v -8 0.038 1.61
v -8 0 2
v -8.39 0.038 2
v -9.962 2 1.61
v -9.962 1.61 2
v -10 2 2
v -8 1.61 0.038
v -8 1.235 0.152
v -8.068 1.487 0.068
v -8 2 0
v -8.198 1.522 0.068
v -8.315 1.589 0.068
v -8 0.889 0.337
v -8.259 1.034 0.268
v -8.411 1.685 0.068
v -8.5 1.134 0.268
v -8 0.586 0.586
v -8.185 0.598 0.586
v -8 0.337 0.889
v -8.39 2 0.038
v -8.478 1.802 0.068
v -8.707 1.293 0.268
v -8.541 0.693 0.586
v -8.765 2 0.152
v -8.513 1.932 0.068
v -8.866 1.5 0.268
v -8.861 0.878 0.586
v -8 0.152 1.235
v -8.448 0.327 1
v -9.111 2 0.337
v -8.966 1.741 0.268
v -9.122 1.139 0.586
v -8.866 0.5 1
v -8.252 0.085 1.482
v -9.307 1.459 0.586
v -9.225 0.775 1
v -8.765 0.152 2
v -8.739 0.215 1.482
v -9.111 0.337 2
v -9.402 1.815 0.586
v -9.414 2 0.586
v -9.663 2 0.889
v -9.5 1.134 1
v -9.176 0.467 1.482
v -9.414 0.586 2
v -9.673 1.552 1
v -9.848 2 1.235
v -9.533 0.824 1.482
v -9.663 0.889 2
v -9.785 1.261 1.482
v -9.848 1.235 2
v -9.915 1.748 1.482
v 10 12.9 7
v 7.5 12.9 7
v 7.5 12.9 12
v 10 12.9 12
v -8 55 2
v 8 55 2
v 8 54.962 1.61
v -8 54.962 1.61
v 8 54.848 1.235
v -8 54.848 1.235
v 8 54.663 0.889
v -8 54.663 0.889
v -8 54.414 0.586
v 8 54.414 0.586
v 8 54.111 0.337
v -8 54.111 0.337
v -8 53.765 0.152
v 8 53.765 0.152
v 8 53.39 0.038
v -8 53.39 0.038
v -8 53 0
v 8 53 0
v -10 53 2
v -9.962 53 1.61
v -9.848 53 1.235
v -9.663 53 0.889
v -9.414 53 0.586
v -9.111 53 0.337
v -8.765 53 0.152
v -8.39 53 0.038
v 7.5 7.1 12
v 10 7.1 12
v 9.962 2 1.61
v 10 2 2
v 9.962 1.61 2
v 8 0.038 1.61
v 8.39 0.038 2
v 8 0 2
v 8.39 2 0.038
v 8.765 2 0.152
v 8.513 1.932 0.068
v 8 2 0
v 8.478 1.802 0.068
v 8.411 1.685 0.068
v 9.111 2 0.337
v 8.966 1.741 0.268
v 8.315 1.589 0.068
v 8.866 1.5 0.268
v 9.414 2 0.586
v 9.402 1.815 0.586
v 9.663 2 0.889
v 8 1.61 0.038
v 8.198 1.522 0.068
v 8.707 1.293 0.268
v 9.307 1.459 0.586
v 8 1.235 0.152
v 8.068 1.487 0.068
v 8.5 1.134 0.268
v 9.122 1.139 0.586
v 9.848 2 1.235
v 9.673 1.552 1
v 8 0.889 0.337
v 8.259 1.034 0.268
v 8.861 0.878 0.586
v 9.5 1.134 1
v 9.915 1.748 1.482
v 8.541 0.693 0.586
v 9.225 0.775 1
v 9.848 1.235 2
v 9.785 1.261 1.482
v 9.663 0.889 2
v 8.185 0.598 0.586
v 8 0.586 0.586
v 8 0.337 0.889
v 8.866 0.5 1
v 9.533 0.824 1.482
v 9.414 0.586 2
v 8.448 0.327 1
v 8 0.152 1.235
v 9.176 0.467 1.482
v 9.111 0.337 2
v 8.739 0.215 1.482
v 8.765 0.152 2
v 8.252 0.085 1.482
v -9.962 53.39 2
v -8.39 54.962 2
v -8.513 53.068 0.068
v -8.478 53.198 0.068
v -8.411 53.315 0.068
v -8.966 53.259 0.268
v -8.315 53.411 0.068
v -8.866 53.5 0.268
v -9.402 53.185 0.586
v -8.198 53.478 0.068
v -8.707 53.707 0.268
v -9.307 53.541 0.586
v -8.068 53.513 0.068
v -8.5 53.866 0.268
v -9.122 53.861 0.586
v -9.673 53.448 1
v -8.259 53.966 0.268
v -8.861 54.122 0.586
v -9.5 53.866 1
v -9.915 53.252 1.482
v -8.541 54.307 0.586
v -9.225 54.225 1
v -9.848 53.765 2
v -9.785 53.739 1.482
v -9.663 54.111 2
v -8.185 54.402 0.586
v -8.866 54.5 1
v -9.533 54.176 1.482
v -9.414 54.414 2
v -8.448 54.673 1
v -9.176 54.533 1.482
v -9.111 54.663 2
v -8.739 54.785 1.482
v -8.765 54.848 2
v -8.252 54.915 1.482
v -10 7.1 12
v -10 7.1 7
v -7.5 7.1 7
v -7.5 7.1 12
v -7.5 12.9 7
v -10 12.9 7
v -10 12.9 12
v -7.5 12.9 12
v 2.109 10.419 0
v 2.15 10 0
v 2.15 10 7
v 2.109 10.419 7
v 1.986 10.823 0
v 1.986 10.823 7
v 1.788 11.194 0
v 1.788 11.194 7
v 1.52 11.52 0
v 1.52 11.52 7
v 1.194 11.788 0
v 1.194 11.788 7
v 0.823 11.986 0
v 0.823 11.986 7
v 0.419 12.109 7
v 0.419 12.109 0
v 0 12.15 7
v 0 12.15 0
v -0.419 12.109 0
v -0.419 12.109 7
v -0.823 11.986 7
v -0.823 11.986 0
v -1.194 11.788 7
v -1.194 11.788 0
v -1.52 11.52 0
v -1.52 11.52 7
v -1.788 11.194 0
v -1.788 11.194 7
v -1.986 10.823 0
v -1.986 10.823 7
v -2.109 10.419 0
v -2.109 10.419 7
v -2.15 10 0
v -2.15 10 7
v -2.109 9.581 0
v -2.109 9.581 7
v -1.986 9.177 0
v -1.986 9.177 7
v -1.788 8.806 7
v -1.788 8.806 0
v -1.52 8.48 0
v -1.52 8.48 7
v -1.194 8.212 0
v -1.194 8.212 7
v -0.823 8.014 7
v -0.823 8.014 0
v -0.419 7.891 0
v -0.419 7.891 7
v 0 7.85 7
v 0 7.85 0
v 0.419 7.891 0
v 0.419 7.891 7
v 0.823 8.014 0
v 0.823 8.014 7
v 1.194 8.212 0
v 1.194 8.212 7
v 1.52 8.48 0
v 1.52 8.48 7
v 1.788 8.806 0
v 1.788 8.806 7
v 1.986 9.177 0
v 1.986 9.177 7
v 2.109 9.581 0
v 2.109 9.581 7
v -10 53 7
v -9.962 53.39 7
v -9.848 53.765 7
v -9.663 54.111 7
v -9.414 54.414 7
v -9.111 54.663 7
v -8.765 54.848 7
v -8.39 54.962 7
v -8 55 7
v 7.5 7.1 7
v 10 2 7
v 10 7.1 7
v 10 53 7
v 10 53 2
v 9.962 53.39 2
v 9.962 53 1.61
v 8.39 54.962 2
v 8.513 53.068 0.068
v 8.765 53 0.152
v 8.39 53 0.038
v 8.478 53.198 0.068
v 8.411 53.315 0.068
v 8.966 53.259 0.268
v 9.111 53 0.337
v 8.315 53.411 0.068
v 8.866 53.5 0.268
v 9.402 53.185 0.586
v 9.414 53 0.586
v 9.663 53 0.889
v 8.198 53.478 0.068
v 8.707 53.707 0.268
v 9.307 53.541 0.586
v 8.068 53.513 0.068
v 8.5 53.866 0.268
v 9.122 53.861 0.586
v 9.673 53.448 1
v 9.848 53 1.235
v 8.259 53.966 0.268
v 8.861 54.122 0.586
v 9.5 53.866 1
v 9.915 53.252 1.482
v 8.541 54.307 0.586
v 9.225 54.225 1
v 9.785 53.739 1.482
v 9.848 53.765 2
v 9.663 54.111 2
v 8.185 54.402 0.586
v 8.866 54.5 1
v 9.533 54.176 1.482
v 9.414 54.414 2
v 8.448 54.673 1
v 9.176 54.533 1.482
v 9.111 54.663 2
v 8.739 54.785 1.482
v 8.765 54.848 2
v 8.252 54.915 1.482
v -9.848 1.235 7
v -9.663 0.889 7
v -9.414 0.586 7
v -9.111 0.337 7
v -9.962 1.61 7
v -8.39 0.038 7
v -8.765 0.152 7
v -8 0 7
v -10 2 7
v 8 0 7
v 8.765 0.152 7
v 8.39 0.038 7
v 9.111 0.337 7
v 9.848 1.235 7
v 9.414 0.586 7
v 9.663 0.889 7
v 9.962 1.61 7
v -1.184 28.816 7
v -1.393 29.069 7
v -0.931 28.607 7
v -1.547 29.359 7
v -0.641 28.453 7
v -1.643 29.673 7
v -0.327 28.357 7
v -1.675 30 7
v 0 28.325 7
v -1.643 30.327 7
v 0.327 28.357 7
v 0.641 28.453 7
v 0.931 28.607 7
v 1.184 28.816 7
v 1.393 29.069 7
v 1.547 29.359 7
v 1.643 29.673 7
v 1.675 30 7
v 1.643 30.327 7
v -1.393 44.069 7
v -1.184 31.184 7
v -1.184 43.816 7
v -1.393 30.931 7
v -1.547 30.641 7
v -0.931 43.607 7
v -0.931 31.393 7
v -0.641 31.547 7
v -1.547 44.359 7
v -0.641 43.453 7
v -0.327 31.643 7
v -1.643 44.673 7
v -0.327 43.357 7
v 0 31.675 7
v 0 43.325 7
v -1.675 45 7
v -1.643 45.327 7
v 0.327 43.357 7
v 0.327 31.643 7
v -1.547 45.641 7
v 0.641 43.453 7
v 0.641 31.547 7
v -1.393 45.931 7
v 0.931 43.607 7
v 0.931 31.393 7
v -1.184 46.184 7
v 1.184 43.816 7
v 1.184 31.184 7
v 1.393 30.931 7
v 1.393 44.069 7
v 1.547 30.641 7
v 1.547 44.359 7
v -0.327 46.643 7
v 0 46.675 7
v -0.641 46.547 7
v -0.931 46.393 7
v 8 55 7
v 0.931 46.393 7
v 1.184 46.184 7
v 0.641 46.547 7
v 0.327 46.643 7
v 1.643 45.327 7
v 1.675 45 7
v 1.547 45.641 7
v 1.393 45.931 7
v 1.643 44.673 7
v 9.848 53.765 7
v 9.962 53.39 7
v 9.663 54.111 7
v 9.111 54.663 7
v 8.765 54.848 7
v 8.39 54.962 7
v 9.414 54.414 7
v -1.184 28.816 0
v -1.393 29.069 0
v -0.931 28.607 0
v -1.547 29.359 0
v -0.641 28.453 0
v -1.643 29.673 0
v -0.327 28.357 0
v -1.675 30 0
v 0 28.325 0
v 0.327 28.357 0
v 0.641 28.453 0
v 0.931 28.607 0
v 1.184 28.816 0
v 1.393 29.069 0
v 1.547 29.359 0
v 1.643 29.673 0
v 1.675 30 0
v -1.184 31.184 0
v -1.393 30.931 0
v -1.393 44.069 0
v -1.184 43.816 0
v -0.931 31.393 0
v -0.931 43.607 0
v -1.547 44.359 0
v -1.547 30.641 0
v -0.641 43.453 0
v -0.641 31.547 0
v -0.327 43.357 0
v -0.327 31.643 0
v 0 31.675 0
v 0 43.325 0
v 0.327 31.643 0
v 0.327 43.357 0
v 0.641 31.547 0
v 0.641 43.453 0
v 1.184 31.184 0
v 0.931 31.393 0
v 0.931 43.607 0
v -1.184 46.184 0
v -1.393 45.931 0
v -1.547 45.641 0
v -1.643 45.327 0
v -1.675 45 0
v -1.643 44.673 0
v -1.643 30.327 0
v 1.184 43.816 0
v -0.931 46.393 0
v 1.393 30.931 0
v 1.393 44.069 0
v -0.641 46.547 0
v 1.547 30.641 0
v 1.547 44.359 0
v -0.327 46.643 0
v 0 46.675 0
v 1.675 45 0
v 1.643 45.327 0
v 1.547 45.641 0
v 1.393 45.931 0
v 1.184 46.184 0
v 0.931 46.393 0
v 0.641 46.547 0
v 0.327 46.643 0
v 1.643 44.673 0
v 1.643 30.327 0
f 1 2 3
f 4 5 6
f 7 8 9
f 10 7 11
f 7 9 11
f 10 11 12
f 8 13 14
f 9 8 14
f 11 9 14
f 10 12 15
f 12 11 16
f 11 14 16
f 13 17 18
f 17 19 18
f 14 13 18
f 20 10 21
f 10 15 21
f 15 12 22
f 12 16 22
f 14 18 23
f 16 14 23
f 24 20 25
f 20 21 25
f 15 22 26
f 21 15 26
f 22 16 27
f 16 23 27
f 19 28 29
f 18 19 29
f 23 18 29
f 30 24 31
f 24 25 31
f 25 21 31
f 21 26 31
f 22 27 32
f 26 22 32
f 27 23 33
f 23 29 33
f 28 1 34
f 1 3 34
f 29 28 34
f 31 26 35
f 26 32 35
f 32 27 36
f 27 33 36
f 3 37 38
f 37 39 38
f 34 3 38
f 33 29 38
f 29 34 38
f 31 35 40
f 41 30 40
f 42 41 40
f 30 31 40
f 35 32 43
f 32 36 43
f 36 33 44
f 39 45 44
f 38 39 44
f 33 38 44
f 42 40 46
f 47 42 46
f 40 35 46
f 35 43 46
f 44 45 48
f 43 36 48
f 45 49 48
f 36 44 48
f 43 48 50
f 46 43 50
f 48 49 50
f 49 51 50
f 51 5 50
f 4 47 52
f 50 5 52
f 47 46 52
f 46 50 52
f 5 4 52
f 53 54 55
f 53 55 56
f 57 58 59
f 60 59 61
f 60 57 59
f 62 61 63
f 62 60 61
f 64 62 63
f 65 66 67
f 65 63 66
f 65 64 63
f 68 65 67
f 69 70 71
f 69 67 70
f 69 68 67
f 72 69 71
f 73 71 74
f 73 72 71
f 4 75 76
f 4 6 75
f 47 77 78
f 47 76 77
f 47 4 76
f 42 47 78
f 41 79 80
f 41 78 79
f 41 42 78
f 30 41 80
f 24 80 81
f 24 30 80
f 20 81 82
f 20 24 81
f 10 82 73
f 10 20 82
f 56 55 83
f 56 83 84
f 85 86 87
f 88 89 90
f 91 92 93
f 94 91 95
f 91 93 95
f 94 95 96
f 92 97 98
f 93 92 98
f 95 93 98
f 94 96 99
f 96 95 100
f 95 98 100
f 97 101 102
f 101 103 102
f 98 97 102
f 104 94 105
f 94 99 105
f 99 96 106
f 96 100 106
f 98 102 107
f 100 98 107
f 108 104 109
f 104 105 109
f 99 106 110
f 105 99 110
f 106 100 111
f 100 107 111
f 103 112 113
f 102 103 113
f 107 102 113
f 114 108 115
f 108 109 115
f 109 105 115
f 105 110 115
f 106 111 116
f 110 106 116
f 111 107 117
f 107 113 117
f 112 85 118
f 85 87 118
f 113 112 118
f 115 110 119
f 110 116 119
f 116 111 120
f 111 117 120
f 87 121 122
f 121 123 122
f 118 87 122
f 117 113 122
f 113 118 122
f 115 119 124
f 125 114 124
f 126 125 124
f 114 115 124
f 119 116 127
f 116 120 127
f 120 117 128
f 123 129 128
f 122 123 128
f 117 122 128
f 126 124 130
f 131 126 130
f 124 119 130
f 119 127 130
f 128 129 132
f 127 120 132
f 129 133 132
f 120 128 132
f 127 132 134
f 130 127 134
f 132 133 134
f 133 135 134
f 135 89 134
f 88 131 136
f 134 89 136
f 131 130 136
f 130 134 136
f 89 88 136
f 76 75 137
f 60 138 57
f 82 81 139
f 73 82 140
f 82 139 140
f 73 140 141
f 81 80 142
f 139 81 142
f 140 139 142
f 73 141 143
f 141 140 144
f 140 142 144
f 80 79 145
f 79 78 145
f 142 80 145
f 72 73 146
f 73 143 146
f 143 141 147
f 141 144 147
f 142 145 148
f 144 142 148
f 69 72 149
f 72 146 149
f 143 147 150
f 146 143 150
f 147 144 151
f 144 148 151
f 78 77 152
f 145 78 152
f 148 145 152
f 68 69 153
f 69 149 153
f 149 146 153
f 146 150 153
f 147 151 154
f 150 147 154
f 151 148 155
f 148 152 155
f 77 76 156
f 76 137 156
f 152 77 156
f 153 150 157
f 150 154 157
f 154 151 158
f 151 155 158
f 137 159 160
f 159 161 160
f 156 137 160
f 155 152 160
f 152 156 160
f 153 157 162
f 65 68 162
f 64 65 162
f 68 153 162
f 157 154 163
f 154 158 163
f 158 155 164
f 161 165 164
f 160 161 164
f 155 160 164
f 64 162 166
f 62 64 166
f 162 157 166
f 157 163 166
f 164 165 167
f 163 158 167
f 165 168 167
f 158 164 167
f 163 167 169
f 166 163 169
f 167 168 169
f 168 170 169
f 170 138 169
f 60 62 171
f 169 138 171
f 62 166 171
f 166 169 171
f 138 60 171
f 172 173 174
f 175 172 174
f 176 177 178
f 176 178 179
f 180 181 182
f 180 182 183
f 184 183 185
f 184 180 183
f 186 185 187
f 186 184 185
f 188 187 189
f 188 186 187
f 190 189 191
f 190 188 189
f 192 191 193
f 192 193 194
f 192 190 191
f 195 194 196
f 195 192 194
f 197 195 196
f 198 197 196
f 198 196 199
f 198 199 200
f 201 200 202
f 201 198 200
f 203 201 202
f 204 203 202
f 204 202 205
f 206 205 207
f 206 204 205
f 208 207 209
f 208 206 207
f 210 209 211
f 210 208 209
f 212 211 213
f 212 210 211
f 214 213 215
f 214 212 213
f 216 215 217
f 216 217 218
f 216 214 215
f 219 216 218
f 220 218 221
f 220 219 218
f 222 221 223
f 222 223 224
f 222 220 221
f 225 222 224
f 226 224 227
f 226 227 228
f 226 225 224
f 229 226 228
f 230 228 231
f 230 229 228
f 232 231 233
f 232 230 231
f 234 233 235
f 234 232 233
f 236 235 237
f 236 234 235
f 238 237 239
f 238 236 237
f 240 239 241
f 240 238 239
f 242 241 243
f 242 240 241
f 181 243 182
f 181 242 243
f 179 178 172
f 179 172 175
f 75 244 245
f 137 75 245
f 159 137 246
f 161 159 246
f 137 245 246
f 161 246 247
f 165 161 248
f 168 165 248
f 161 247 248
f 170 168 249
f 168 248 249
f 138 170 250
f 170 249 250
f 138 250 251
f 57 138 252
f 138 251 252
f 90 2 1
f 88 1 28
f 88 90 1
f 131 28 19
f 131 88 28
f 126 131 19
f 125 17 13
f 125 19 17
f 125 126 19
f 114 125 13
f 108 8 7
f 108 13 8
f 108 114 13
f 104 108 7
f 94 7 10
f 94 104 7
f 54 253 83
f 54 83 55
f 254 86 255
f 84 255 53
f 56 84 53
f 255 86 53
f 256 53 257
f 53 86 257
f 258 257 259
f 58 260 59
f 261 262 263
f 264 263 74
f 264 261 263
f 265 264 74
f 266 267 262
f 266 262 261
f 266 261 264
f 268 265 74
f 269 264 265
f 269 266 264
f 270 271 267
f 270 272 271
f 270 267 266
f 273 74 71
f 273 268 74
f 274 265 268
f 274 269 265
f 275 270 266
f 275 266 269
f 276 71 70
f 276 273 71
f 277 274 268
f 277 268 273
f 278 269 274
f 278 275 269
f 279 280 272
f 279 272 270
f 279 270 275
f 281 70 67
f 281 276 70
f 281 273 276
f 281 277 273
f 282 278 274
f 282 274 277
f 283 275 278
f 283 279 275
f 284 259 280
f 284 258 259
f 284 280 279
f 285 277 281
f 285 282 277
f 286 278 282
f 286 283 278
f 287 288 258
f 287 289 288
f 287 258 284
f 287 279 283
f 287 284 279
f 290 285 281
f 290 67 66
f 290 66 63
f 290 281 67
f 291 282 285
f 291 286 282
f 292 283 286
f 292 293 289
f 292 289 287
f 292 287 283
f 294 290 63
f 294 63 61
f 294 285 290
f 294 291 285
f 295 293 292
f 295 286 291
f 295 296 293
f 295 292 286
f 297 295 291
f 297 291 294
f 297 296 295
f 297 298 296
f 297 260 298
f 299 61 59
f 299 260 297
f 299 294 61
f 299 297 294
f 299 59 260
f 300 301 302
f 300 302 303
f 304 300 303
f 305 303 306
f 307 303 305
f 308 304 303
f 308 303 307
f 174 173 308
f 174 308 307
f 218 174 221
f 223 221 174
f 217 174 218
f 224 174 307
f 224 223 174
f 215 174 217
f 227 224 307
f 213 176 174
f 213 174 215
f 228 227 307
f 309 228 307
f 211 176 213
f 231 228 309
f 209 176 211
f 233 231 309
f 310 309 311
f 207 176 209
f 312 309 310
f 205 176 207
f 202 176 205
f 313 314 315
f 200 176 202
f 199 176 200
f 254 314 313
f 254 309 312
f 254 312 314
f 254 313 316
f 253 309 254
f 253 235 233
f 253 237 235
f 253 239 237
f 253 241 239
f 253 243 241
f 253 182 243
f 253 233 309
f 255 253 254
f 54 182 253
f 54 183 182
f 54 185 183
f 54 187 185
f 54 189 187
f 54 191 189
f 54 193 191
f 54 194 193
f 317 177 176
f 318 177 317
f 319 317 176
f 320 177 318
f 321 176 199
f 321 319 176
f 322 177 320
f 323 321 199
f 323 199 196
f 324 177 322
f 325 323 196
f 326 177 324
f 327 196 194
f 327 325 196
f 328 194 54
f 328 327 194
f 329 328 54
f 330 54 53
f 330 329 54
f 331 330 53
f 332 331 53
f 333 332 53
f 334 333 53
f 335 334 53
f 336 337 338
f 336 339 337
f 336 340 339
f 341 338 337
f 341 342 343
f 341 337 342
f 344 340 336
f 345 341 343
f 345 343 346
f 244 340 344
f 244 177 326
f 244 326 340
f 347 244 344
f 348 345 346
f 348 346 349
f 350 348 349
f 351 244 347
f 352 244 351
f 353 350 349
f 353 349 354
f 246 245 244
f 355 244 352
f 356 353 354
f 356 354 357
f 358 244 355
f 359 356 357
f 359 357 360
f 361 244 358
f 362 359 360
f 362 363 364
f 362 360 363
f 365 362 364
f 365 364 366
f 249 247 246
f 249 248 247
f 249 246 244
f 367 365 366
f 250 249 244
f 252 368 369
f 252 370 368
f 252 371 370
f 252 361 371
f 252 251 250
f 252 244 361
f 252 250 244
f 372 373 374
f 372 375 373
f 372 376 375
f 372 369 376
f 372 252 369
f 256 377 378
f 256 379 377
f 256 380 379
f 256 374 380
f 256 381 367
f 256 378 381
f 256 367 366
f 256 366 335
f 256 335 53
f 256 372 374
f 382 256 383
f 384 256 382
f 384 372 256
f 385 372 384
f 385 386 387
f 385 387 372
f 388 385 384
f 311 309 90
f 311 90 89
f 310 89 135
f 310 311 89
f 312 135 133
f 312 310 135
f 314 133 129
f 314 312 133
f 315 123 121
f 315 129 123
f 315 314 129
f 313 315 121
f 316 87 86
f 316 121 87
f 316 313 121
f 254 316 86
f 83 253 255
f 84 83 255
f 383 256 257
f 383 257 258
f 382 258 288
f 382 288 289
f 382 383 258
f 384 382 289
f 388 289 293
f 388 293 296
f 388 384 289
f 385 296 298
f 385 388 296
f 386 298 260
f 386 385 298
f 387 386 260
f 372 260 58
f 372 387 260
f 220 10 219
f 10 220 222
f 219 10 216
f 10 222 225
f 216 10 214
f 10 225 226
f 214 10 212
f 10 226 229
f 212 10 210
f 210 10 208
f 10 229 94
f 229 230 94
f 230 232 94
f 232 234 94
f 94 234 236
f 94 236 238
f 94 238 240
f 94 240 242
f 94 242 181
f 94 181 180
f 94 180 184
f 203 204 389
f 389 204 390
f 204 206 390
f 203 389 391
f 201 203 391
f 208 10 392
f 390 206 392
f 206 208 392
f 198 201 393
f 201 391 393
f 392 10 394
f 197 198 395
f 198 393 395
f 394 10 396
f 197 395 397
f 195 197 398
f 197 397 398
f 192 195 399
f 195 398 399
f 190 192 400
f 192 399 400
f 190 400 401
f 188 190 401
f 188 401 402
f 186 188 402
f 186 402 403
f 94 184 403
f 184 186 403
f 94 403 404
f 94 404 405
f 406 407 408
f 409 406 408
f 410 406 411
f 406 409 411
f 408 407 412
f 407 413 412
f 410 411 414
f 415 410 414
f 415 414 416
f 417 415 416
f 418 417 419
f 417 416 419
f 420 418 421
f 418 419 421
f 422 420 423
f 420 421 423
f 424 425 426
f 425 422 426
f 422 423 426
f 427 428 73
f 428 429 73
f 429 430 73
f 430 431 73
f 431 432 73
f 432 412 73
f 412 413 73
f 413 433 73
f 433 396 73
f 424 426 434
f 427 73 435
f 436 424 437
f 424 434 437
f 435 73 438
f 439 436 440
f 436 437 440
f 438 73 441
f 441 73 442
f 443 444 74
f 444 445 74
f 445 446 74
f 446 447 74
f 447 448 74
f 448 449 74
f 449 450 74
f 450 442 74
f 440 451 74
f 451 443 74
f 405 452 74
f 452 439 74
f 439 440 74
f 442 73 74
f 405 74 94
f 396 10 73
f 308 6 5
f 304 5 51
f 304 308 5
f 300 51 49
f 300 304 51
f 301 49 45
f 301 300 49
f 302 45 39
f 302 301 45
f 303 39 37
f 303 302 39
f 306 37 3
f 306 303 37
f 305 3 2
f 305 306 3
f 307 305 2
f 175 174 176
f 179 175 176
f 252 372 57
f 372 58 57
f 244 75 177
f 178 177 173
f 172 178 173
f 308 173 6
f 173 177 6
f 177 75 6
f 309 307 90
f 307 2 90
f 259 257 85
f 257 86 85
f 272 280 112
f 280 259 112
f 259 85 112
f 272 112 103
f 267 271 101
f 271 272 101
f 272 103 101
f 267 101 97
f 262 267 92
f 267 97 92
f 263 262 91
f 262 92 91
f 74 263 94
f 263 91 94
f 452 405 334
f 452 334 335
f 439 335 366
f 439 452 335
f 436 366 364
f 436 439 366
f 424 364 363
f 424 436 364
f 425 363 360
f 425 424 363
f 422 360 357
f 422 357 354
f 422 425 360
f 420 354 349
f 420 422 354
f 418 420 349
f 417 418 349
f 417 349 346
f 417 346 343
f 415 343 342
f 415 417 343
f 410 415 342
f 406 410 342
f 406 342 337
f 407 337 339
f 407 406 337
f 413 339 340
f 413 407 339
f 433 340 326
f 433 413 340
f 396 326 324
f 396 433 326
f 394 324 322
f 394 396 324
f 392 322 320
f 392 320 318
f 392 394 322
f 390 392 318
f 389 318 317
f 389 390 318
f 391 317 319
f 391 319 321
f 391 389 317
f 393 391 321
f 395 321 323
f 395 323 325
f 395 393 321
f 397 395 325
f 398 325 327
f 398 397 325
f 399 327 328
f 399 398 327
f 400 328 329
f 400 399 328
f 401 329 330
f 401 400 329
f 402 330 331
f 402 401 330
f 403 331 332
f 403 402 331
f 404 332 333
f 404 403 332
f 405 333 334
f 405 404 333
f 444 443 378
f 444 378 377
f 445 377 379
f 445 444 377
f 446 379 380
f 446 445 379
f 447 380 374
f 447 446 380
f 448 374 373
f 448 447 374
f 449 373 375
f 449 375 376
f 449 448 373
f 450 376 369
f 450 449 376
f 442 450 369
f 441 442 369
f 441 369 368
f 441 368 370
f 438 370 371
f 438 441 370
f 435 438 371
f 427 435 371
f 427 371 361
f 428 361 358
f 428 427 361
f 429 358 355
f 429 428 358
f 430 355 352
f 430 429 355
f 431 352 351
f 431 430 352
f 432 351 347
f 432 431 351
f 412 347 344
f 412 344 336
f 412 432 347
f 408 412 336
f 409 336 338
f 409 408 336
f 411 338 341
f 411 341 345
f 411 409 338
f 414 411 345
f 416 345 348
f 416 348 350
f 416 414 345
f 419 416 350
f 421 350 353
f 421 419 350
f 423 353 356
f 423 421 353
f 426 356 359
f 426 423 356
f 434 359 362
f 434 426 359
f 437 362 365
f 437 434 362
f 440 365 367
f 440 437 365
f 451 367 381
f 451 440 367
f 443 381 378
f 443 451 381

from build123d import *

# Parameters (mm, degrees)
F0_R     = 2.15
F0_R_2   = 1.675
F0_W     = 2.5
F0_H     = 5.8
F1_DEPTH = 7
F2_DEPTH = 12
F3_R     = 2


with BuildPart() as f1:
    # F0 (on Top) → F1 (new body)
    with BuildSketch(Plane.XY):
        Polygon((-10, 7.1), (-10, 0), (10, 0), (10, 7.1), (7.5, 7.1), (7.5, 12.9), (10, 12.9), (10, 55), (-10, 55), (-10, 12.9), (-7.5, 12.9), (-7.5, 7.1), align=None)
        with Locations((0, 10)):
            Circle(F0_R, mode=Mode.SUBTRACT)
        with Locations((0, 30)):
            Circle(F0_R_2, mode=Mode.SUBTRACT)
        with Locations((0, 45)):
            Circle(F0_R_2, mode=Mode.SUBTRACT)
        with Locations((-8.75, 10)):
            Rectangle(F0_W, F0_H)
        with Locations((8.75, 10)):
            Rectangle(F0_W, F0_H)
    extrude(amount=F1_DEPTH)

    # F0 (on Top) → F2 (join)
    with BuildSketch(Plane.XY):
        with Locations((-8.75, 10)):
            Rectangle(F0_W, F0_H)
        with Locations((8.75, 10)):
            Rectangle(F0_W, F0_H)
    extrude(amount=F2_DEPTH)

    # F3
    f3_edges = [f1.edges().sort_by_distance(p)[0] for p in [
        (10, 0, 3.5),
        (-10, 0, 3.5),
        (10, 55, 3.5),
        (-10, 55, 3.5),
        (10, 27.5, 0),
        (0, 0, 0),
        (-10, 27.5, 0),
        (0, 55, 0),
    ]]
    fillet(f3_edges, radius=F3_R)


solid = f1.part
